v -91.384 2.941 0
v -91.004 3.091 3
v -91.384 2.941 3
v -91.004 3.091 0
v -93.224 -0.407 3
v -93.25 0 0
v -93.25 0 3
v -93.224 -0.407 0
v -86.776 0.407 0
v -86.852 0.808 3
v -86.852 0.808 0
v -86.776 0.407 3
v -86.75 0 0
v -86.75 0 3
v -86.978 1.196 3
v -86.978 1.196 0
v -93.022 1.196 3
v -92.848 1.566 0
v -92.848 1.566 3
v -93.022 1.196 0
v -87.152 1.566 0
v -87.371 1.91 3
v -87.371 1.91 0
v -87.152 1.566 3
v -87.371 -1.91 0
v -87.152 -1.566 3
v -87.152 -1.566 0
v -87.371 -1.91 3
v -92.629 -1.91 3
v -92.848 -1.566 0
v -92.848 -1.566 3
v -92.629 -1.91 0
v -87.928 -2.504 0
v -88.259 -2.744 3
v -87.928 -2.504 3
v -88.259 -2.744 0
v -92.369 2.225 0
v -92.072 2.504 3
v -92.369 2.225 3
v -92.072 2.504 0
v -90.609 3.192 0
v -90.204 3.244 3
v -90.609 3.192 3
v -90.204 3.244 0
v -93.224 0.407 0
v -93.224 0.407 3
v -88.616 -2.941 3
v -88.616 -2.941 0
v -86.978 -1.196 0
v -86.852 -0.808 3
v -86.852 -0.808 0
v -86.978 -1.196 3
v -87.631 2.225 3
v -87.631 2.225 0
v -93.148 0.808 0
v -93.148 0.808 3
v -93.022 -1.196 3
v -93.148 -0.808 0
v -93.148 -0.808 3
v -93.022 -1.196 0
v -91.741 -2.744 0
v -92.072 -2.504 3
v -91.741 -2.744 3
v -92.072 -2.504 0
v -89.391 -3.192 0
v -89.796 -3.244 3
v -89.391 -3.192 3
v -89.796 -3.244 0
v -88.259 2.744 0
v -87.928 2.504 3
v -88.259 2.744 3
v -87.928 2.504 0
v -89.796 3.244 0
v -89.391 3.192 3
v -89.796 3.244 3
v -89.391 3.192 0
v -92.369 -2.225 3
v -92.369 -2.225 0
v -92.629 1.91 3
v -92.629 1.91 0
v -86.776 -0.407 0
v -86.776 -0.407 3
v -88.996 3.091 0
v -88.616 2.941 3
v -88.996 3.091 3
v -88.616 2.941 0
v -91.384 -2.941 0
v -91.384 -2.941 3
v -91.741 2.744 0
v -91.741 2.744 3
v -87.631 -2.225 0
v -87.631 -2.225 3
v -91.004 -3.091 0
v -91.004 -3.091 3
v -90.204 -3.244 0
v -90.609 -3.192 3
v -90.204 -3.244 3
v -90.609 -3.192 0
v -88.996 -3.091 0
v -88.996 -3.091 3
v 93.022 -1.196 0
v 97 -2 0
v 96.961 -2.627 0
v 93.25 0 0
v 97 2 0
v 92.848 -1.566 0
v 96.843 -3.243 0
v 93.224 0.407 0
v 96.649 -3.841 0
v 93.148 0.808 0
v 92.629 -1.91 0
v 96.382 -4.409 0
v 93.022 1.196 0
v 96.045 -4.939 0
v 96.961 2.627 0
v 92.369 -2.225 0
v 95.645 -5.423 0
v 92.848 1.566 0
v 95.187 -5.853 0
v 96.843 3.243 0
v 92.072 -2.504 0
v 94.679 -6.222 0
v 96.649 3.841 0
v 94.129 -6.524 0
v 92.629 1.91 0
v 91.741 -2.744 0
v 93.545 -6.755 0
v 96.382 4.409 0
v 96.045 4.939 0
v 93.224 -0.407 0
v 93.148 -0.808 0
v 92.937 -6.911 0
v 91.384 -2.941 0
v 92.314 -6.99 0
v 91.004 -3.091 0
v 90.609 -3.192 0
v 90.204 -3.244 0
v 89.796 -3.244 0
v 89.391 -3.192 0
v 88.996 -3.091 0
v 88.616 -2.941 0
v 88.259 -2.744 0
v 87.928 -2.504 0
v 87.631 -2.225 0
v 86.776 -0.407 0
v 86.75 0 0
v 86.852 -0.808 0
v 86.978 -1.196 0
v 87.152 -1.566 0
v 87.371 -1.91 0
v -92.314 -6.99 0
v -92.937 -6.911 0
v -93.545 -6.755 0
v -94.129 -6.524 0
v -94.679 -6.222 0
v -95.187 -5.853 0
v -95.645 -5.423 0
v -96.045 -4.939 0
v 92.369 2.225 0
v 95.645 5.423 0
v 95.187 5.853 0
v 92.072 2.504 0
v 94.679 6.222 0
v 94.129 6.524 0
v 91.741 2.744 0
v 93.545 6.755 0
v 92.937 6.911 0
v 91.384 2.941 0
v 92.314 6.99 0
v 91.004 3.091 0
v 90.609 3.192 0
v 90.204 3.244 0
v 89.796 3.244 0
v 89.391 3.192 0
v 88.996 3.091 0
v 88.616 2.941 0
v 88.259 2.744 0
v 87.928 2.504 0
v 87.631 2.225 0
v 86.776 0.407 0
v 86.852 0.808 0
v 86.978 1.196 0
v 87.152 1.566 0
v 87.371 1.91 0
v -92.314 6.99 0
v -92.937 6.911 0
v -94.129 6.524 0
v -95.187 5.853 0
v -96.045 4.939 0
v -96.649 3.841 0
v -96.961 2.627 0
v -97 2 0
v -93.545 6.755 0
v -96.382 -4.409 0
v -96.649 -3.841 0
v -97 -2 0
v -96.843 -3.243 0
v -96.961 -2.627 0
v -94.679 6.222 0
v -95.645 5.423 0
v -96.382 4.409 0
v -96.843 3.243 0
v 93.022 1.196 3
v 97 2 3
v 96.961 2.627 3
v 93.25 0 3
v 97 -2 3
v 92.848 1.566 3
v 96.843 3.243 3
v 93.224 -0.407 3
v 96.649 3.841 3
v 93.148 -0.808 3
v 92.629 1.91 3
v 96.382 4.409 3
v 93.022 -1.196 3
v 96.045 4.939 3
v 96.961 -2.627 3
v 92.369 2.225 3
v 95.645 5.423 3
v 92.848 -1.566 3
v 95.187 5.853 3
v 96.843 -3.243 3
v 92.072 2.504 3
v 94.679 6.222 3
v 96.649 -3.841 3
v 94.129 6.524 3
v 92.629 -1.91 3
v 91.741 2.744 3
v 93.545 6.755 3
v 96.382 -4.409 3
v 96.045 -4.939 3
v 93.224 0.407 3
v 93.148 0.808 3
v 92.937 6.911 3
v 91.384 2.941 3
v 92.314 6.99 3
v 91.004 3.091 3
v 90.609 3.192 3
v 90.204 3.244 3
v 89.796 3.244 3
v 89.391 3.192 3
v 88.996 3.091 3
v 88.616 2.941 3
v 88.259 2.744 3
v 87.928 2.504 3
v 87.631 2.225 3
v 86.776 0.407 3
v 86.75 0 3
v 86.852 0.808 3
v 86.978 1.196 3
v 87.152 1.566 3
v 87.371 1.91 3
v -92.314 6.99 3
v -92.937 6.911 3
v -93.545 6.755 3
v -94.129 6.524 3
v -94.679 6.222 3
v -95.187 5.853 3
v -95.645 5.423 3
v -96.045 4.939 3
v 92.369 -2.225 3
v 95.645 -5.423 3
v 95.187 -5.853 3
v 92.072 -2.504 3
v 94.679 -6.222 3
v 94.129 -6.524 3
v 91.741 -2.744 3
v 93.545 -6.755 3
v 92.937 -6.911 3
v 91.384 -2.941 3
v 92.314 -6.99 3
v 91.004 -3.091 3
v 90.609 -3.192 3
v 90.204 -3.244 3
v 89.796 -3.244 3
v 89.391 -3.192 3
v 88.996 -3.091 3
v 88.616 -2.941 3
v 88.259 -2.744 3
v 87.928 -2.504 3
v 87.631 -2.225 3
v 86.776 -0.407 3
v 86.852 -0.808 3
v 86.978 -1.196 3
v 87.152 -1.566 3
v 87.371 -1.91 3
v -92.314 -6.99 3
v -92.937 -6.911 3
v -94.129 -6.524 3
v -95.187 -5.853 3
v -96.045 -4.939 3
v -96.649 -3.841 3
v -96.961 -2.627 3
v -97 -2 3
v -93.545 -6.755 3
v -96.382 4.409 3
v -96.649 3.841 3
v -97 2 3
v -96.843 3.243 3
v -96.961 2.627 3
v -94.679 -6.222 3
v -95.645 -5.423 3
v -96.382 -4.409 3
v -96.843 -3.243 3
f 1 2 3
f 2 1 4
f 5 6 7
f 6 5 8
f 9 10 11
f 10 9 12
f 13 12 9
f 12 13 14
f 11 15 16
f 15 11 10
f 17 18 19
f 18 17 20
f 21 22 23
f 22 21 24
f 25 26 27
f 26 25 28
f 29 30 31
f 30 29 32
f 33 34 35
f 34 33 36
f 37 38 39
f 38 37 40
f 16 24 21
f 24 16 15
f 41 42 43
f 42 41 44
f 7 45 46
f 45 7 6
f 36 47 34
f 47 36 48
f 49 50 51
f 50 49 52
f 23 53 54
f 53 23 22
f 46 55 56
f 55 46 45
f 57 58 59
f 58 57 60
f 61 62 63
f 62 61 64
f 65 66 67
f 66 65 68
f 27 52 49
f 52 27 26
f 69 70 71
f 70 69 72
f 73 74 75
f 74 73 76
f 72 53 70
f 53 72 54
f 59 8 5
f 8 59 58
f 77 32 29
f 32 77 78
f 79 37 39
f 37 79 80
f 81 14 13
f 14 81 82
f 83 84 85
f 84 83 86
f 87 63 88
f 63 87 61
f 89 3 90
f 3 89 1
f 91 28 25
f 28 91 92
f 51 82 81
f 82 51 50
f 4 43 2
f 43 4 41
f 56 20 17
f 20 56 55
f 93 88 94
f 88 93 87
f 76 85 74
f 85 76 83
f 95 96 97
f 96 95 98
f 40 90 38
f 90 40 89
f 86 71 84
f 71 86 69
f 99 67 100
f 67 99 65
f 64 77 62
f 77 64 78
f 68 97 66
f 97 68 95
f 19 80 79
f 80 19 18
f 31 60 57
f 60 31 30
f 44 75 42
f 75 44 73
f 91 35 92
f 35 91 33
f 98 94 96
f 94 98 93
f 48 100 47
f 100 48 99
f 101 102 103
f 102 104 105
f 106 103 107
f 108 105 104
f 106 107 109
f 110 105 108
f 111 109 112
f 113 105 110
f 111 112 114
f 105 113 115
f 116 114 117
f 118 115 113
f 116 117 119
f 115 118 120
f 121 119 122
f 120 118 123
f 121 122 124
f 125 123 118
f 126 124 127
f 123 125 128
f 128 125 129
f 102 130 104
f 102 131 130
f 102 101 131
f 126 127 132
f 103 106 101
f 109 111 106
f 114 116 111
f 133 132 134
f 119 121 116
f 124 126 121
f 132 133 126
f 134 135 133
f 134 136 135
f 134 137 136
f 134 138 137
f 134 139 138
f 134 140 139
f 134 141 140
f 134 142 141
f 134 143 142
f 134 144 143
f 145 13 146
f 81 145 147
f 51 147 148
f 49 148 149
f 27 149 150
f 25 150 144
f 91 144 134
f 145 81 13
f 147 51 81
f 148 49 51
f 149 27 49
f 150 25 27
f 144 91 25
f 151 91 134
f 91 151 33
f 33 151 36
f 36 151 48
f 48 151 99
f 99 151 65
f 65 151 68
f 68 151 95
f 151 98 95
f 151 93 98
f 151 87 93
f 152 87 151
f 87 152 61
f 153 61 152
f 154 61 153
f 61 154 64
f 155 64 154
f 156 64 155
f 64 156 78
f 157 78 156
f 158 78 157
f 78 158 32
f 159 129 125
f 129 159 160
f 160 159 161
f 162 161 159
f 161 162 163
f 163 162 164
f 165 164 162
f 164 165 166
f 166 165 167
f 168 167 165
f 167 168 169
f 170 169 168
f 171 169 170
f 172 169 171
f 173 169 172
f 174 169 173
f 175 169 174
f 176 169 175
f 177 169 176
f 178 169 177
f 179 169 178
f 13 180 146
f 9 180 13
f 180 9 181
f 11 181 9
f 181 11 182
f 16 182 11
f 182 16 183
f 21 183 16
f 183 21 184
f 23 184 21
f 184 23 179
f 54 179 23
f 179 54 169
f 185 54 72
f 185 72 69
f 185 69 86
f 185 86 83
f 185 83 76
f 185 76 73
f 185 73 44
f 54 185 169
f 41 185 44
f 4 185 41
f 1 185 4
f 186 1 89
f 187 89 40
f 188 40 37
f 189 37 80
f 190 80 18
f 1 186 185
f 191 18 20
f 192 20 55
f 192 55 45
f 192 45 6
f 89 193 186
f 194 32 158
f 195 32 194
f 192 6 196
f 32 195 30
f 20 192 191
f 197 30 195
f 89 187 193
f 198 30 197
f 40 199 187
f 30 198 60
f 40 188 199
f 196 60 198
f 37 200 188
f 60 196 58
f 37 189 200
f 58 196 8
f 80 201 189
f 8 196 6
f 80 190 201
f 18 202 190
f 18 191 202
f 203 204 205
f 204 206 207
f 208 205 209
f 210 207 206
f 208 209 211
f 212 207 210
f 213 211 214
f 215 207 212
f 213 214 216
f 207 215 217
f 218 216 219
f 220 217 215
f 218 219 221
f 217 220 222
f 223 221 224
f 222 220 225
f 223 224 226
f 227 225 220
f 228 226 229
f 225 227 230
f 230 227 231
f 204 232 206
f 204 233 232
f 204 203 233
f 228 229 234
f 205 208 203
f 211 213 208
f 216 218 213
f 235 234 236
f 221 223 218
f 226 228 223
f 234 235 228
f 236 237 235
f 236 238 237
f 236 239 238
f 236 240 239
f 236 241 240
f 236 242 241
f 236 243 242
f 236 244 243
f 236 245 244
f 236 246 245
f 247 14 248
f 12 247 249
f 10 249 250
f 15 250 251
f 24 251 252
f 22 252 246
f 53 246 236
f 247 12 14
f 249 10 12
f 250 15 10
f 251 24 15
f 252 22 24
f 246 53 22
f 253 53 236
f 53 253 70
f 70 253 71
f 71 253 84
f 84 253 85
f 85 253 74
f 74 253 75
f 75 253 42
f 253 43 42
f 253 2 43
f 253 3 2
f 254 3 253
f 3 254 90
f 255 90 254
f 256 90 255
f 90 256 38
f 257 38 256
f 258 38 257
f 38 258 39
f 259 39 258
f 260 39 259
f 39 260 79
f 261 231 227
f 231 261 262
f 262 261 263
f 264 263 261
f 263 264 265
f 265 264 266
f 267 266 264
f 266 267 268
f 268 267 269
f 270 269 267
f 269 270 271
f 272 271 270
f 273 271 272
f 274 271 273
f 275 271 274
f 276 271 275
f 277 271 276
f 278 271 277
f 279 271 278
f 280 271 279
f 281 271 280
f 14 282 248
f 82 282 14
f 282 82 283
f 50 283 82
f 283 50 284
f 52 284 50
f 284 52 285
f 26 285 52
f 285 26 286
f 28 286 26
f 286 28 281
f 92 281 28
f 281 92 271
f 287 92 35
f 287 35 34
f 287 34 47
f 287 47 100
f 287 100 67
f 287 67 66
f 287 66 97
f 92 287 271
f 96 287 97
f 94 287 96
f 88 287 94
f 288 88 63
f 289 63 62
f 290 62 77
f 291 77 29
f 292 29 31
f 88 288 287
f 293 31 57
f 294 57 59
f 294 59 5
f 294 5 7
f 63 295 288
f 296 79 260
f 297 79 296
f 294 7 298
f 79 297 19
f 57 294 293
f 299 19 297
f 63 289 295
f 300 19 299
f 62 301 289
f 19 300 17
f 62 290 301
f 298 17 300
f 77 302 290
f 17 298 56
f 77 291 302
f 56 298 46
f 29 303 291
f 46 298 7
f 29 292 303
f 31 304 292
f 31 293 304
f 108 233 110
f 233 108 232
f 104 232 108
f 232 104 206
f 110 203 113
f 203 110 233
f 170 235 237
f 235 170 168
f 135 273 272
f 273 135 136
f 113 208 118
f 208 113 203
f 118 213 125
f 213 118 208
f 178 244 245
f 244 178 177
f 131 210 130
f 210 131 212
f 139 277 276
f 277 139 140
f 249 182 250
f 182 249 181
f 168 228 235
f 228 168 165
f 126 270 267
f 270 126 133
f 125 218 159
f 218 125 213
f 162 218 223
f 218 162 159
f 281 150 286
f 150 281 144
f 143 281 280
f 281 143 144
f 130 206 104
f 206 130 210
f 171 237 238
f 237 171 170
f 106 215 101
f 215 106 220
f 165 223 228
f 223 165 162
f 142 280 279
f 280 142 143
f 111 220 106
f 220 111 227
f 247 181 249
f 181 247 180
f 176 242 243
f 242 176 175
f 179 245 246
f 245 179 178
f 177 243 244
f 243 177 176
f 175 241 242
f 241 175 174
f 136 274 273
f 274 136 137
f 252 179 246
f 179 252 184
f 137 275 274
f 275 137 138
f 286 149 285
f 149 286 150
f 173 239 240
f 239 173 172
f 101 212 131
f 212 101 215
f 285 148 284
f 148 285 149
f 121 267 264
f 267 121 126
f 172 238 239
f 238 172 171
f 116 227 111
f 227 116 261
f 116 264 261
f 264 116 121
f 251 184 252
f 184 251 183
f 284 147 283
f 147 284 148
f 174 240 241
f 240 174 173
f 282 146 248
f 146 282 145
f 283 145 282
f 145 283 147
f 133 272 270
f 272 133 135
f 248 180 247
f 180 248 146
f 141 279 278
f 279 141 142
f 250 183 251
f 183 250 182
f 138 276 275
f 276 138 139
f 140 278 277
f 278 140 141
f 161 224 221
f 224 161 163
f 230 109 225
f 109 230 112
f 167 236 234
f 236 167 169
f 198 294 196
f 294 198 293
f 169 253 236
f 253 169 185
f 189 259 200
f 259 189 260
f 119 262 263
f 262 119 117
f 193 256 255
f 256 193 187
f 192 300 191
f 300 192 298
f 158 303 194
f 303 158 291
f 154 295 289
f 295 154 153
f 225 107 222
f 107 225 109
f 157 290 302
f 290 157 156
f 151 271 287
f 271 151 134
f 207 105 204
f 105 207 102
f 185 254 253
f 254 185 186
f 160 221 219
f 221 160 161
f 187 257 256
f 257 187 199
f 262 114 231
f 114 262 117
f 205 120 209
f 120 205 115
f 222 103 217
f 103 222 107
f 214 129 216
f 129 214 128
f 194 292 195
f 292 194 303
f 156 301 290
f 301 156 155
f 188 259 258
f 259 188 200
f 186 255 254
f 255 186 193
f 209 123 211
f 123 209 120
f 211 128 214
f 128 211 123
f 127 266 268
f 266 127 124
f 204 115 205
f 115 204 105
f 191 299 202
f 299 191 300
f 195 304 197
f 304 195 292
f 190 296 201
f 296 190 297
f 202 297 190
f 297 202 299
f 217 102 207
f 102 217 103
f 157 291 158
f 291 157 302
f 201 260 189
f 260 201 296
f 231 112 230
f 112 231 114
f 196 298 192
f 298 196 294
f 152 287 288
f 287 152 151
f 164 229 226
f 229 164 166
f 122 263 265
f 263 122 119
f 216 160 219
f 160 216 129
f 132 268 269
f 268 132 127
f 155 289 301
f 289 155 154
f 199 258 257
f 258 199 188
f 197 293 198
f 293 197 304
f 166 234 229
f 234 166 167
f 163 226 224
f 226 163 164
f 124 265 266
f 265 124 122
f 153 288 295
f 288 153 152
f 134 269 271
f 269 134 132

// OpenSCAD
$fn = 50;


difference() {
	union() {
		hull() {
			translate(v = [-92.0000000000, 2.0000000000, 0]) {
				cylinder(h = 3, r = 5);
			}
			translate(v = [92.0000000000, 2.0000000000, 0]) {
				cylinder(h = 3, r = 5);
			}
			translate(v = [-92.0000000000, -2.0000000000, 0]) {
				cylinder(h = 3, r = 5);
			}
			translate(v = [92.0000000000, -2.0000000000, 0]) {
				cylinder(h = 3, r = 5);
			}
		}
	}
	union() {
		translate(v = [-90.0000000000, 0.0000000000, 0]) {
			cylinder(h = 3, r = 3.2500000000);
		}
		translate(v = [90.0000000000, 0.0000000000, 0]) {
			cylinder(h = 3, r = 3.2500000000);
		}
		translate(v = [-90.0000000000, 0.0000000000, 0]) {
			cylinder(h = 3, r = 1.8000000000);
		}
		translate(v = [90.0000000000, 0.0000000000, 0]) {
			cylinder(h = 3, r = 1.8000000000);
		}
		translate(v = [-90.0000000000, 0.0000000000, 0]) {
			cylinder(h = 3, r = 1.8000000000);
		}
		translate(v = [90.0000000000, 0.0000000000, 0]) {
			cylinder(h = 3, r = 1.8000000000);
		}
		translate(v = [-90.0000000000, 0.0000000000, 0]) {
			cylinder(h = 3, r = 1.8000000000);
		}
		translate(v = [90.0000000000, 0.0000000000, 0]) {
			cylinder(h = 3, r = 1.8000000000);
		}
	}
}
